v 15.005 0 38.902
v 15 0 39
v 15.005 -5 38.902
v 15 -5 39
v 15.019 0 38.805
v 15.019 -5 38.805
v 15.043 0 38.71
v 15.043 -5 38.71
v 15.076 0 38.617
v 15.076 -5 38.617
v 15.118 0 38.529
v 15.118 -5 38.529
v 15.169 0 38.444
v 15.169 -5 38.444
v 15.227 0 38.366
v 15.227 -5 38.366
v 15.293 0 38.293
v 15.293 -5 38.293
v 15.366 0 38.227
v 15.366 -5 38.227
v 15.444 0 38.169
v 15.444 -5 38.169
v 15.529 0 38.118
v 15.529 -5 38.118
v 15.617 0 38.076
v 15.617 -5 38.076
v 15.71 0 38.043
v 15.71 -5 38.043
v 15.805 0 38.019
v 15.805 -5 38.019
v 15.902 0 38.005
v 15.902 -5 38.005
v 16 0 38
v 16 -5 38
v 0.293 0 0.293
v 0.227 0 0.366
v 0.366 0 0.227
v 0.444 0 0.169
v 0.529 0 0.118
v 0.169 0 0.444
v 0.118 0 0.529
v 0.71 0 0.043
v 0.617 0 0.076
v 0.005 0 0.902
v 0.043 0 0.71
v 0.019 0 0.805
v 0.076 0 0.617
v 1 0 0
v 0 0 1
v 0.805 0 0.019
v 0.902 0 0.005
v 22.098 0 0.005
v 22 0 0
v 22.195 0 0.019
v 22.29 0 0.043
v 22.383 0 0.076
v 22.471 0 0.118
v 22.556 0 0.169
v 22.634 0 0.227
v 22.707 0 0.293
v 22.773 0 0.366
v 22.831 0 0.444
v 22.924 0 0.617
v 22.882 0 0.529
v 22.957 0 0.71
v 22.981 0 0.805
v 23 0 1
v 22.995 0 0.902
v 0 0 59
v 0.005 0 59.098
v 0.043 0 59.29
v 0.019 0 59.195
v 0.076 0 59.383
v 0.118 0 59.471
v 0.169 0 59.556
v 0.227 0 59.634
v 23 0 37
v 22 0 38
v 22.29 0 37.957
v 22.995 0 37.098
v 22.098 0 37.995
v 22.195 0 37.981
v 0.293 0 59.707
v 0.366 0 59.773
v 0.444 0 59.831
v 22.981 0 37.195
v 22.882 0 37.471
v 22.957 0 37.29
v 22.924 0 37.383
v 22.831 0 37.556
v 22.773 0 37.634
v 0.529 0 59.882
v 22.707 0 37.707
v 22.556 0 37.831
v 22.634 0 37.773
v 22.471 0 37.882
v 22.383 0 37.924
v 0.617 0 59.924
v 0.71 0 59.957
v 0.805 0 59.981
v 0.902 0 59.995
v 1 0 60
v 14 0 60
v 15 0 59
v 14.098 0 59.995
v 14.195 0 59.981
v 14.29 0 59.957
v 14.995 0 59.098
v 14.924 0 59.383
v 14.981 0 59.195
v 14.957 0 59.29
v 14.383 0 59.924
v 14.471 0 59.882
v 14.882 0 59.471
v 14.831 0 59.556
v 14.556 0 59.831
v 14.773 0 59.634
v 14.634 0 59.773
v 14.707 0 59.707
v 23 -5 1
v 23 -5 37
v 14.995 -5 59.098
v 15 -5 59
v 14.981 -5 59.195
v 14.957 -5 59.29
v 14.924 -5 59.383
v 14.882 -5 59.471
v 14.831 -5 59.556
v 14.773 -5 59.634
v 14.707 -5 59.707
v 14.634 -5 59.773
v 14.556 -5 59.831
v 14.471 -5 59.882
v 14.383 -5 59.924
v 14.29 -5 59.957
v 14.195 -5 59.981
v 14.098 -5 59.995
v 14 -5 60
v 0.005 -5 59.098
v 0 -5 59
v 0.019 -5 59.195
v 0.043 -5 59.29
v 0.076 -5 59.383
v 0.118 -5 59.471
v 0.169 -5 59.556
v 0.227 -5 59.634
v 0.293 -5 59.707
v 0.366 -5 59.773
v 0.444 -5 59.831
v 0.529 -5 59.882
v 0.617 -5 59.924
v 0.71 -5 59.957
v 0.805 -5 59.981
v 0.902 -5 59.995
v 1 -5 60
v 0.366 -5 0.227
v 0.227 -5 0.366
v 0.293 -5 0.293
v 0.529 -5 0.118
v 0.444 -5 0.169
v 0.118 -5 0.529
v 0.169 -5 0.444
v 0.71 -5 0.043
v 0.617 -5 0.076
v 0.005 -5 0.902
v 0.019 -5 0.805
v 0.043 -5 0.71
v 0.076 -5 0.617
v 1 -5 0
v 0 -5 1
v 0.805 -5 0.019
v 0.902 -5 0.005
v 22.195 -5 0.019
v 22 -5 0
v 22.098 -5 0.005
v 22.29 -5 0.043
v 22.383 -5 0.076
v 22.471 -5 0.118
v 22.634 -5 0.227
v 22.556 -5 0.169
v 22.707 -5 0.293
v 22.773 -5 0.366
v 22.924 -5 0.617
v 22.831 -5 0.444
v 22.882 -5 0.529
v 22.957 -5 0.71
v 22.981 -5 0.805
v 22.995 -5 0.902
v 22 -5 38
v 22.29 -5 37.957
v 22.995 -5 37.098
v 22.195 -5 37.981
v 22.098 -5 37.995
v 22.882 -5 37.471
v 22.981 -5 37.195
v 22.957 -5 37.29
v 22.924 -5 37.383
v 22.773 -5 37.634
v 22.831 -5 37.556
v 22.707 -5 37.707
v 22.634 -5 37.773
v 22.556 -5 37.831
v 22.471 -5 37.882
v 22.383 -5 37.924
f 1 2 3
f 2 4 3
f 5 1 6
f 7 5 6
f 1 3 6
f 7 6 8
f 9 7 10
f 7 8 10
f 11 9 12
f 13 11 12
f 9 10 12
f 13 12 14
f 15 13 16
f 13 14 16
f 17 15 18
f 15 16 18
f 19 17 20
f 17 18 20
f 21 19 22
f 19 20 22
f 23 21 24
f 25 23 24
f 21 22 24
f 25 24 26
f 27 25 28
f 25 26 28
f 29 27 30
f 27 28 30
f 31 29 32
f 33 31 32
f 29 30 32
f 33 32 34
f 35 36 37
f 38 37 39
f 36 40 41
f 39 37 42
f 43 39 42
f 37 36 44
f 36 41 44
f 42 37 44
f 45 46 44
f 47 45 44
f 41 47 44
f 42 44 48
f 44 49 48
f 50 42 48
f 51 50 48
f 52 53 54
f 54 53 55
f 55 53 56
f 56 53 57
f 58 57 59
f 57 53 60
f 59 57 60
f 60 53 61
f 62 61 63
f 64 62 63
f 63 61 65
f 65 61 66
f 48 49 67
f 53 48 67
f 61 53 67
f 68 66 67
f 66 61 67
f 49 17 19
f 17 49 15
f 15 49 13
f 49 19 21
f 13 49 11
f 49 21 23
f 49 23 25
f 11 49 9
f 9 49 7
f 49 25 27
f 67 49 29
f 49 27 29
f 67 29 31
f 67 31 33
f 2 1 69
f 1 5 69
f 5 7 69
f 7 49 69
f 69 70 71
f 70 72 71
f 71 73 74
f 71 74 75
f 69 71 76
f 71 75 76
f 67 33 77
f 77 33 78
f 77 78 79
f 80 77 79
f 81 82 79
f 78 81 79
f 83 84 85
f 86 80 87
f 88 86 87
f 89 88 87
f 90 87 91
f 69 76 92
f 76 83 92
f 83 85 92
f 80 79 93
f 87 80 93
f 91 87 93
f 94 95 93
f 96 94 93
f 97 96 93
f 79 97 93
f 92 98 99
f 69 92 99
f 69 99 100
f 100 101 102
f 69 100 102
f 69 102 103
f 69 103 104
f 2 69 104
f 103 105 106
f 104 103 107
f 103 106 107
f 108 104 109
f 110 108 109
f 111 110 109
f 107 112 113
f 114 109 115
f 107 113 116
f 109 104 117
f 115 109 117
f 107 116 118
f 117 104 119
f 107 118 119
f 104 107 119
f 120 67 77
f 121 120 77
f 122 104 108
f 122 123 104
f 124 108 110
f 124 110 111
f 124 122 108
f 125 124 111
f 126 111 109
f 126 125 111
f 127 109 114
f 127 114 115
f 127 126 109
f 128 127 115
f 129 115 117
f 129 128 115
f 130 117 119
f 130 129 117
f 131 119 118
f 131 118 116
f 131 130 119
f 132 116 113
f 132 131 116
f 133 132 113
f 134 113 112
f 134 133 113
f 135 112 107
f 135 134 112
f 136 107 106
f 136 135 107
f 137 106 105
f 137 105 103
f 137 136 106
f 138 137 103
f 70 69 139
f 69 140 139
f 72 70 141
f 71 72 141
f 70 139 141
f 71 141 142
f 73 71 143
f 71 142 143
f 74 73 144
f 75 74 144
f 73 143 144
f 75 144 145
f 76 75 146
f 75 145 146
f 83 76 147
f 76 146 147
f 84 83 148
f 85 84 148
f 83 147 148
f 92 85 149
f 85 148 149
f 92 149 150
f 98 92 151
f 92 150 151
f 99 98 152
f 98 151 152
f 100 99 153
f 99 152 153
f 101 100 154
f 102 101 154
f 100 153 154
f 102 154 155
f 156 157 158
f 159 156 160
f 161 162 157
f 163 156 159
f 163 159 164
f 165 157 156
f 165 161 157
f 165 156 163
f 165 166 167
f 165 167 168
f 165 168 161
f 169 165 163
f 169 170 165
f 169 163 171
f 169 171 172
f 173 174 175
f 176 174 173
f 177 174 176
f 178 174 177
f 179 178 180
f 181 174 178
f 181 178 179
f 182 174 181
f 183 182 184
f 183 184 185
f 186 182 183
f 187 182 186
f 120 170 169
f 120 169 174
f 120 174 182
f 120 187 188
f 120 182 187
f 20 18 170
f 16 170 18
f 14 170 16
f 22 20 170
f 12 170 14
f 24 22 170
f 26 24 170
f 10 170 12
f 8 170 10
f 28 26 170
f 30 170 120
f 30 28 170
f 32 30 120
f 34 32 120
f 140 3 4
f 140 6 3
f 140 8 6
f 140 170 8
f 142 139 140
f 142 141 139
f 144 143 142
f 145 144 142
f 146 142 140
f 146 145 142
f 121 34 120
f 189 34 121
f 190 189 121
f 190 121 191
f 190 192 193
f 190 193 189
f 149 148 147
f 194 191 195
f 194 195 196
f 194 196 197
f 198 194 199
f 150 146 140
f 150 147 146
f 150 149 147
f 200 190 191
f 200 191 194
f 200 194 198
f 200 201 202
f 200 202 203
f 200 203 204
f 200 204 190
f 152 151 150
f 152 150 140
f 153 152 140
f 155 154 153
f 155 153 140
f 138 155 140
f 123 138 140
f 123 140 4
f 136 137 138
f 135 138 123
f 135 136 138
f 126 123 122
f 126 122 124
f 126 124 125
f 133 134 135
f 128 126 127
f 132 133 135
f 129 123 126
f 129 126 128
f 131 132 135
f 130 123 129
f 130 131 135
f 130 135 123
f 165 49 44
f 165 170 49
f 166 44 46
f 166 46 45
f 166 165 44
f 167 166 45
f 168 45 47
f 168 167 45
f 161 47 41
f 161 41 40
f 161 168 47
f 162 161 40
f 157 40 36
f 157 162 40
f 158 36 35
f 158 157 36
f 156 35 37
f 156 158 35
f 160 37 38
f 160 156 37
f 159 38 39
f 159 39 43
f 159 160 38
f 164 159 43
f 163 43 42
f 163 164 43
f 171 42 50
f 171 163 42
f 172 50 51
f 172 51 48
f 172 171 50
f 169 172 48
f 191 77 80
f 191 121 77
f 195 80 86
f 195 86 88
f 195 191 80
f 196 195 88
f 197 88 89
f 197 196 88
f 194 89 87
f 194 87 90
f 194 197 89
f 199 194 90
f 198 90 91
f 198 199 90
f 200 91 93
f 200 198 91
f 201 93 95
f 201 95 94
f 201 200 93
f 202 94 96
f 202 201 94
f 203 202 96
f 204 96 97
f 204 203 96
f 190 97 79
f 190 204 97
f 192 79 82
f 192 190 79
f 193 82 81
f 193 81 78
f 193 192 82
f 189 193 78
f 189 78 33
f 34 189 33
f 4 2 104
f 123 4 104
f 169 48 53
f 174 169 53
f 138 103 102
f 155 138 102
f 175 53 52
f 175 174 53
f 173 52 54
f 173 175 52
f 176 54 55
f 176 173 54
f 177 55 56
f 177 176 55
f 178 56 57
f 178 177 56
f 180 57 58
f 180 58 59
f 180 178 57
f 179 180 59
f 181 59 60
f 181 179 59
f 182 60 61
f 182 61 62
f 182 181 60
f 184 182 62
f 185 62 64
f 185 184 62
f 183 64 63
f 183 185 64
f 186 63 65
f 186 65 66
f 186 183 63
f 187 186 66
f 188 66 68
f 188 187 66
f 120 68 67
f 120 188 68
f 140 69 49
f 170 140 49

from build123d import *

# Parameters (mm, degrees)
F1_DEPTH = 5
F2_R     = 1
F3_R     = 1


with BuildPart() as f1:
    # F0 (on Front) → F1 (new body)
    with BuildSketch(Plane.XZ):
        Polygon((0, 60), (0, 0), (23, 0), (23, 38), (15, 38), (15, 60), align=None)
    extrude(amount=F1_DEPTH)

    # F2
    f2_edges = [f1.edges().sort_by_distance(p)[0] for p in [
        (0, -2.5, 60),
        (15, -2.5, 60),
        (23, -2.5, 38),
        (0, -2.5, 0),
        (23, -2.5, 0),
    ]]
    fillet(f2_edges, radius=F2_R)

    # F3
    f3_edges = [f1.edges().sort_by_distance(p)[0] for p in [
        (15, -2.5, 38),
    ]]
    fillet(f3_edges, radius=F3_R)


solid = f1.part
